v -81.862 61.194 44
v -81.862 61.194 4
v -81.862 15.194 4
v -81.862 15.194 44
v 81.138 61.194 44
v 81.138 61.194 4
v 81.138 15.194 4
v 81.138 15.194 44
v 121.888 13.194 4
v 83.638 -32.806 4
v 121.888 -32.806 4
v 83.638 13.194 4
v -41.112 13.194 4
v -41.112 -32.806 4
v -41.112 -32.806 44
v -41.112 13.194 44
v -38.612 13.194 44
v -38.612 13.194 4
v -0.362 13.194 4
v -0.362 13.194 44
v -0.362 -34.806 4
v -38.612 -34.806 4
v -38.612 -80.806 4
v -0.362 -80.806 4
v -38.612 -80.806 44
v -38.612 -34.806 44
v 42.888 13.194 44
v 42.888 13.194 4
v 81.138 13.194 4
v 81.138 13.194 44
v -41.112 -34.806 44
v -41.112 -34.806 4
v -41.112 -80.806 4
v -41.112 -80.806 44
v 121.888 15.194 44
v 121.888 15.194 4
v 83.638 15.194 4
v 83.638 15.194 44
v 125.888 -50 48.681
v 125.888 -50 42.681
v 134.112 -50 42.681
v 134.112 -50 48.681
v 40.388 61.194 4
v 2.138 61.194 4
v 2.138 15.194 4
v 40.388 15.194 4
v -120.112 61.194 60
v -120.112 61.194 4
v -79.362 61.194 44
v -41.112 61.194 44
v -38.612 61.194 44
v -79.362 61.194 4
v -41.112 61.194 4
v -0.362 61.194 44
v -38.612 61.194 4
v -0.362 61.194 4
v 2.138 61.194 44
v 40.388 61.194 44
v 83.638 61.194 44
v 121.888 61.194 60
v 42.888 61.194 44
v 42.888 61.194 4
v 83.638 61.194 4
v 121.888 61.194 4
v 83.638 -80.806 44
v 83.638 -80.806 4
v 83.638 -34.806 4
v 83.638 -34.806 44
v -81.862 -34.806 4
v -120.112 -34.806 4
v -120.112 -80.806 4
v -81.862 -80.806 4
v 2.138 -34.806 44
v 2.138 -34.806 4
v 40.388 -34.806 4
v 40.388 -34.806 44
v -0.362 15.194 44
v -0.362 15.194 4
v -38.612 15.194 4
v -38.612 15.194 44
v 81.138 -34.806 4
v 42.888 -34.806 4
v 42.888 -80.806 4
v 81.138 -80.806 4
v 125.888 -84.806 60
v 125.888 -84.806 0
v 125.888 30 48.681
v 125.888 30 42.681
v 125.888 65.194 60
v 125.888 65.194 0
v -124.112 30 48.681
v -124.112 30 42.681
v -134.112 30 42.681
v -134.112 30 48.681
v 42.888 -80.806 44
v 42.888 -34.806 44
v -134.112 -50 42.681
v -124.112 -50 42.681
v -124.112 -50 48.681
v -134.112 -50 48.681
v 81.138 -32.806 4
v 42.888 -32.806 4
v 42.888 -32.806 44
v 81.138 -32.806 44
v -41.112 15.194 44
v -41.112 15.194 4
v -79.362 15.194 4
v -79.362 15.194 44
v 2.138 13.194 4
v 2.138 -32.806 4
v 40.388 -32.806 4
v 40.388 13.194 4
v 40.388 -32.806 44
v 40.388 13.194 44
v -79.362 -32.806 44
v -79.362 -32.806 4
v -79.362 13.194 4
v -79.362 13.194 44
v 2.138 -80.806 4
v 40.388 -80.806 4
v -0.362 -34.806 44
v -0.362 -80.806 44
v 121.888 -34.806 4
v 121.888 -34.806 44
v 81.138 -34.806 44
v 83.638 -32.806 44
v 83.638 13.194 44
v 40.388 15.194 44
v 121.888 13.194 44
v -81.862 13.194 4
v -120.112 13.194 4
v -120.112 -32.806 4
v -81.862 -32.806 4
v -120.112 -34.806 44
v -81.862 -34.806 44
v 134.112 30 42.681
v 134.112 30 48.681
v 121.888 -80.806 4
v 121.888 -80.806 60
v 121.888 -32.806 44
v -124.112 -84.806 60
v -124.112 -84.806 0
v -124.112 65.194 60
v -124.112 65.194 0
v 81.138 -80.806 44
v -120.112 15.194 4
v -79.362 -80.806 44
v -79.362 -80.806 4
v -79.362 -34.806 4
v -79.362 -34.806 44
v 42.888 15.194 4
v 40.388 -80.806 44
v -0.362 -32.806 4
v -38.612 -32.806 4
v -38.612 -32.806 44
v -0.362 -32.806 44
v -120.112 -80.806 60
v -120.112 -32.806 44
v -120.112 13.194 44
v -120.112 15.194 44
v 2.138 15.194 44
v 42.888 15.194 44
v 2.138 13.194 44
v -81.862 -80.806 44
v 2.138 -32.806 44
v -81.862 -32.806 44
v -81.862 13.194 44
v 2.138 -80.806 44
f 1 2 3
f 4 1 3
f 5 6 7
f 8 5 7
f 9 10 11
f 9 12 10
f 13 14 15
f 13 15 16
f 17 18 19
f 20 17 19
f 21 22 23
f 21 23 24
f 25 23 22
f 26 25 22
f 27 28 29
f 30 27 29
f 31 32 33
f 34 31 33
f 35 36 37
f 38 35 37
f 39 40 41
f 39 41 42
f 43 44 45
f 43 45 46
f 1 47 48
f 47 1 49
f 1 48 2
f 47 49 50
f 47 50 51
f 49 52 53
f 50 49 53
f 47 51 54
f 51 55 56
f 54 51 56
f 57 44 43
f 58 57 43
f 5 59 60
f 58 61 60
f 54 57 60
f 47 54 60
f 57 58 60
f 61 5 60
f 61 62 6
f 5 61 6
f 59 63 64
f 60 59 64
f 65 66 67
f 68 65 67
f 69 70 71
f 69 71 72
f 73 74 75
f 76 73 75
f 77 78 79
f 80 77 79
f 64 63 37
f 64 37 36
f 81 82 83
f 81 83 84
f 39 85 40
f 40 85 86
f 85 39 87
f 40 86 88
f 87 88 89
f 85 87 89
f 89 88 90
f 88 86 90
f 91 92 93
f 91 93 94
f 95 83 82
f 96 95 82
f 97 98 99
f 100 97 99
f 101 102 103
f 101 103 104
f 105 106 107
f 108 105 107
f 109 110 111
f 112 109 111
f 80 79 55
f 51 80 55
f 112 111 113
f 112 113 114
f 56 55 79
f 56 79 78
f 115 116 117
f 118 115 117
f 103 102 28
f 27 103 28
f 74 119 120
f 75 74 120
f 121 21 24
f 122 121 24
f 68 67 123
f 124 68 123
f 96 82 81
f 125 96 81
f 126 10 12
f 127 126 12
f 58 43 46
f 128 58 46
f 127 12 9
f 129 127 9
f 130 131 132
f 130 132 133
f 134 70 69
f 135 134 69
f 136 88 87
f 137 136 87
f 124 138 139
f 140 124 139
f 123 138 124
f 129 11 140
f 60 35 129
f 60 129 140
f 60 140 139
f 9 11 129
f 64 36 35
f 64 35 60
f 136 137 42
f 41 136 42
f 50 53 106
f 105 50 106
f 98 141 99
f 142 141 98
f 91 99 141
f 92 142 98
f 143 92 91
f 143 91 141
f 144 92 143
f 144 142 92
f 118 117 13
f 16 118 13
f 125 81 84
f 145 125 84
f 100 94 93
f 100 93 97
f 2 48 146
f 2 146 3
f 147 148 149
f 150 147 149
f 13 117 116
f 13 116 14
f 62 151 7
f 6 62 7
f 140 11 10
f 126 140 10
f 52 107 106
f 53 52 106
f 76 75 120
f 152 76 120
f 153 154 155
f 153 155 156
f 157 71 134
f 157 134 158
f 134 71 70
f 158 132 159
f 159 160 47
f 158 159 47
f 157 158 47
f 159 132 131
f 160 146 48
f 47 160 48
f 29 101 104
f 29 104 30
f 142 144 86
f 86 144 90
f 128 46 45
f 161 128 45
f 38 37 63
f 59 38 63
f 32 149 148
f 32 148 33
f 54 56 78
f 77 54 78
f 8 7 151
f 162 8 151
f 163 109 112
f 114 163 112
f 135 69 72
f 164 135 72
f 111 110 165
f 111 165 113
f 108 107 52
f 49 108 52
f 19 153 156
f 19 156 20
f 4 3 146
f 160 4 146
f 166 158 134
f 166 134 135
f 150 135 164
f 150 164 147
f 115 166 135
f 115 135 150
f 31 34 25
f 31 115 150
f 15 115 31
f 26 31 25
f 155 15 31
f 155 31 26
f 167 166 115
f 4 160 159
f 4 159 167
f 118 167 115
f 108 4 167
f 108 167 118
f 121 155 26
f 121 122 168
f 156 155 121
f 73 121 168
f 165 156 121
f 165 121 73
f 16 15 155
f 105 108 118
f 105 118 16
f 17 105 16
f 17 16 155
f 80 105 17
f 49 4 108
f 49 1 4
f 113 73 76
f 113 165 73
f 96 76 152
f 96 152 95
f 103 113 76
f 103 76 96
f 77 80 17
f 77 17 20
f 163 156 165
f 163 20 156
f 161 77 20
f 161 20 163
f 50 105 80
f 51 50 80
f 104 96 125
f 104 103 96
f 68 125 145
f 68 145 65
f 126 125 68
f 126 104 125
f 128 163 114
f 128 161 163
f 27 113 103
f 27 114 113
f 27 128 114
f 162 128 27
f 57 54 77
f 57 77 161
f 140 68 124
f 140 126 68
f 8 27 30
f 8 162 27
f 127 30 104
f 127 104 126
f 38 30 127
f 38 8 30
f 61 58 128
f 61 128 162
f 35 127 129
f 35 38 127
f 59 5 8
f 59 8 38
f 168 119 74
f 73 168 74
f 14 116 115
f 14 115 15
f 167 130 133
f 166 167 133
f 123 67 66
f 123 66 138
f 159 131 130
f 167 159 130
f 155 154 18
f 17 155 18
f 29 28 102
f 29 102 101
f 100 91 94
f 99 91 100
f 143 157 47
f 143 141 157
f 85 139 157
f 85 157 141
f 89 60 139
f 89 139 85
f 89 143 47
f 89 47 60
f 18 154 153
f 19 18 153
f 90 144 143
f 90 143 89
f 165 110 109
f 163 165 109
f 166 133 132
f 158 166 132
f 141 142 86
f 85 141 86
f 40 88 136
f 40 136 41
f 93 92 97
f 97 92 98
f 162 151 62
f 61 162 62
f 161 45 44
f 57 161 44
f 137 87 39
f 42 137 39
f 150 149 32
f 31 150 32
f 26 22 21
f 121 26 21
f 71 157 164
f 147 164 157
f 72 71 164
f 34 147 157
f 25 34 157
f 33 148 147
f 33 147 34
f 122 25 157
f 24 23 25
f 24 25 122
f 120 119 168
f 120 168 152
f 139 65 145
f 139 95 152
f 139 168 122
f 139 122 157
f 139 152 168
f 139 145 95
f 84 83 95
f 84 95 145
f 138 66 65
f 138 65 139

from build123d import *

# Parameters (mm, degrees)
F0_W     = 250
F0_H     = 150
F1_DEPTH = 60
F2_T     = -4
F3_W     = 38.25
F3_H     = 46
F4_DEPTH = 40
F5_W     = 80
F5_H     = 6
F6_DEPTH = 10


# Not quite as in the source:
# - a pattern or mirror of a feature is missing from the dataset's text; its kind, count and spacing are read off the source's solid


with BuildPart() as f1:
    # F0 (on Top) → F1 (new body)
    with BuildSketch(Plane.XY):
        with Locations((0.8881594986, -9.8060739803)):
            Rectangle(F0_W, F0_H)
    extrude(amount=F1_DEPTH)

    # F2
    f2_openings = [f1.faces().sort_by_distance(p)[0] for p in [
        (0.888159, -9.806074, 60),
    ]]
    offset(amount=F2_T, openings=f2_openings)

    # F3 (on face) → F4 (join)
    with BuildSketch(Plane.XY.offset(4)):
        Polygon((-81.8618405014, 15.1939260197), (-120.1118405014, 15.1939260197), (-120.1118405014, 13.1939260197), (-81.8618405014, 13.1939260197), (-81.8618405014, -32.8060739803), (-120.1118405014, -32.8060739803), (-120.1118405014, -34.8060739803), (-81.8618405014, -34.8060739803), (-81.8618405014, -80.8060739803), (-79.3618405014, -80.8060739803), (-79.3618405014, -34.8060739803), (-41.1118405014, -34.8060739803), (-41.1118405014, -80.8060739803), (-38.6118405014, -80.8060739803), (-38.6118405014, -34.8060739803), (-0.3618405014, -34.8060739803), (-0.3618405014, -80.8060739803), (2.1381594986, -80.8060739803), (2.1381594986, -34.8060739803), (40.3881594986, -34.8060739803), (40.3881594986, -80.8060739803), (42.8881594986, -80.8060739803), (42.8881594986, -34.8060739803), (81.1381594986, -34.8060739803), (81.1381594986, -80.8060739803), (83.6381594986, -80.8060739803), (83.6381594986, -34.8060739803), (121.8881594986, -34.8060739803), (121.8881594986, -32.8060739803), (83.6381594986, -32.8060739803), (83.6381594986, 13.1939260197), (121.8881594986, 13.1939260197), (121.8881594986, 15.1939260197), (83.6381594986, 15.1939260197), (83.6381594986, 61.1939260197), (81.1381594986, 61.1939260197), (81.1381594986, 15.1939260197), (42.8881594986, 15.1939260197), (42.8881594986, 61.1939260197), (40.3881594986, 61.1939260197), (40.3881594986, 15.1939260197), (2.1510550287, 15.1939260197), (2.1381594986, 15.1939260197), (2.1381594986, 61.1939260197), (-0.3618405014, 61.1939260197), (-0.3618405014, 15.1939260197), (-38.6118405014, 15.1939260197), (-38.6118405014, 61.1939260197), (-41.1118405014, 61.1939260197), (-41.1118405014, 15.1939260197), (-79.3618405014, 15.1939260197), (-79.3618405014, 61.1939260197), (-81.8618405014, 61.1939260197), align=None)
        with Locations((-60.2368405014, -9.8060739803)):
            Rectangle(F3_W, F3_H, mode=Mode.SUBTRACT)
        with Locations((-19.4868405014, -9.8060739803)):
            Rectangle(F3_W, F3_H, mode=Mode.SUBTRACT)
        with Locations((21.2631594986, -9.8060739803)):
            Rectangle(F3_W, F3_H, mode=Mode.SUBTRACT)
        with Locations((62.0131594986, -9.8060739803)):
            Rectangle(F3_W, F3_H, mode=Mode.SUBTRACT)
    extrude(amount=F4_DEPTH)

    # F5 (on face) → F6 (join)
    with BuildSketch(Plane(origin=(-124.1118405014, 0, 0), x_dir=(0, -1, 0), z_dir=(-1, 0, 0))):
        with Locations((10, 45.6811115146)):
            Rectangle(F5_W, F5_H)
    f6 = extrude(amount=F6_DEPTH)

    # F6_copies: F6 across plane
    add(f6.mirror(Plane(origin=(0, 0, 0), x_dir=(0, 0, 1), z_dir=(1, 0, 0))))


solid = f1.part
